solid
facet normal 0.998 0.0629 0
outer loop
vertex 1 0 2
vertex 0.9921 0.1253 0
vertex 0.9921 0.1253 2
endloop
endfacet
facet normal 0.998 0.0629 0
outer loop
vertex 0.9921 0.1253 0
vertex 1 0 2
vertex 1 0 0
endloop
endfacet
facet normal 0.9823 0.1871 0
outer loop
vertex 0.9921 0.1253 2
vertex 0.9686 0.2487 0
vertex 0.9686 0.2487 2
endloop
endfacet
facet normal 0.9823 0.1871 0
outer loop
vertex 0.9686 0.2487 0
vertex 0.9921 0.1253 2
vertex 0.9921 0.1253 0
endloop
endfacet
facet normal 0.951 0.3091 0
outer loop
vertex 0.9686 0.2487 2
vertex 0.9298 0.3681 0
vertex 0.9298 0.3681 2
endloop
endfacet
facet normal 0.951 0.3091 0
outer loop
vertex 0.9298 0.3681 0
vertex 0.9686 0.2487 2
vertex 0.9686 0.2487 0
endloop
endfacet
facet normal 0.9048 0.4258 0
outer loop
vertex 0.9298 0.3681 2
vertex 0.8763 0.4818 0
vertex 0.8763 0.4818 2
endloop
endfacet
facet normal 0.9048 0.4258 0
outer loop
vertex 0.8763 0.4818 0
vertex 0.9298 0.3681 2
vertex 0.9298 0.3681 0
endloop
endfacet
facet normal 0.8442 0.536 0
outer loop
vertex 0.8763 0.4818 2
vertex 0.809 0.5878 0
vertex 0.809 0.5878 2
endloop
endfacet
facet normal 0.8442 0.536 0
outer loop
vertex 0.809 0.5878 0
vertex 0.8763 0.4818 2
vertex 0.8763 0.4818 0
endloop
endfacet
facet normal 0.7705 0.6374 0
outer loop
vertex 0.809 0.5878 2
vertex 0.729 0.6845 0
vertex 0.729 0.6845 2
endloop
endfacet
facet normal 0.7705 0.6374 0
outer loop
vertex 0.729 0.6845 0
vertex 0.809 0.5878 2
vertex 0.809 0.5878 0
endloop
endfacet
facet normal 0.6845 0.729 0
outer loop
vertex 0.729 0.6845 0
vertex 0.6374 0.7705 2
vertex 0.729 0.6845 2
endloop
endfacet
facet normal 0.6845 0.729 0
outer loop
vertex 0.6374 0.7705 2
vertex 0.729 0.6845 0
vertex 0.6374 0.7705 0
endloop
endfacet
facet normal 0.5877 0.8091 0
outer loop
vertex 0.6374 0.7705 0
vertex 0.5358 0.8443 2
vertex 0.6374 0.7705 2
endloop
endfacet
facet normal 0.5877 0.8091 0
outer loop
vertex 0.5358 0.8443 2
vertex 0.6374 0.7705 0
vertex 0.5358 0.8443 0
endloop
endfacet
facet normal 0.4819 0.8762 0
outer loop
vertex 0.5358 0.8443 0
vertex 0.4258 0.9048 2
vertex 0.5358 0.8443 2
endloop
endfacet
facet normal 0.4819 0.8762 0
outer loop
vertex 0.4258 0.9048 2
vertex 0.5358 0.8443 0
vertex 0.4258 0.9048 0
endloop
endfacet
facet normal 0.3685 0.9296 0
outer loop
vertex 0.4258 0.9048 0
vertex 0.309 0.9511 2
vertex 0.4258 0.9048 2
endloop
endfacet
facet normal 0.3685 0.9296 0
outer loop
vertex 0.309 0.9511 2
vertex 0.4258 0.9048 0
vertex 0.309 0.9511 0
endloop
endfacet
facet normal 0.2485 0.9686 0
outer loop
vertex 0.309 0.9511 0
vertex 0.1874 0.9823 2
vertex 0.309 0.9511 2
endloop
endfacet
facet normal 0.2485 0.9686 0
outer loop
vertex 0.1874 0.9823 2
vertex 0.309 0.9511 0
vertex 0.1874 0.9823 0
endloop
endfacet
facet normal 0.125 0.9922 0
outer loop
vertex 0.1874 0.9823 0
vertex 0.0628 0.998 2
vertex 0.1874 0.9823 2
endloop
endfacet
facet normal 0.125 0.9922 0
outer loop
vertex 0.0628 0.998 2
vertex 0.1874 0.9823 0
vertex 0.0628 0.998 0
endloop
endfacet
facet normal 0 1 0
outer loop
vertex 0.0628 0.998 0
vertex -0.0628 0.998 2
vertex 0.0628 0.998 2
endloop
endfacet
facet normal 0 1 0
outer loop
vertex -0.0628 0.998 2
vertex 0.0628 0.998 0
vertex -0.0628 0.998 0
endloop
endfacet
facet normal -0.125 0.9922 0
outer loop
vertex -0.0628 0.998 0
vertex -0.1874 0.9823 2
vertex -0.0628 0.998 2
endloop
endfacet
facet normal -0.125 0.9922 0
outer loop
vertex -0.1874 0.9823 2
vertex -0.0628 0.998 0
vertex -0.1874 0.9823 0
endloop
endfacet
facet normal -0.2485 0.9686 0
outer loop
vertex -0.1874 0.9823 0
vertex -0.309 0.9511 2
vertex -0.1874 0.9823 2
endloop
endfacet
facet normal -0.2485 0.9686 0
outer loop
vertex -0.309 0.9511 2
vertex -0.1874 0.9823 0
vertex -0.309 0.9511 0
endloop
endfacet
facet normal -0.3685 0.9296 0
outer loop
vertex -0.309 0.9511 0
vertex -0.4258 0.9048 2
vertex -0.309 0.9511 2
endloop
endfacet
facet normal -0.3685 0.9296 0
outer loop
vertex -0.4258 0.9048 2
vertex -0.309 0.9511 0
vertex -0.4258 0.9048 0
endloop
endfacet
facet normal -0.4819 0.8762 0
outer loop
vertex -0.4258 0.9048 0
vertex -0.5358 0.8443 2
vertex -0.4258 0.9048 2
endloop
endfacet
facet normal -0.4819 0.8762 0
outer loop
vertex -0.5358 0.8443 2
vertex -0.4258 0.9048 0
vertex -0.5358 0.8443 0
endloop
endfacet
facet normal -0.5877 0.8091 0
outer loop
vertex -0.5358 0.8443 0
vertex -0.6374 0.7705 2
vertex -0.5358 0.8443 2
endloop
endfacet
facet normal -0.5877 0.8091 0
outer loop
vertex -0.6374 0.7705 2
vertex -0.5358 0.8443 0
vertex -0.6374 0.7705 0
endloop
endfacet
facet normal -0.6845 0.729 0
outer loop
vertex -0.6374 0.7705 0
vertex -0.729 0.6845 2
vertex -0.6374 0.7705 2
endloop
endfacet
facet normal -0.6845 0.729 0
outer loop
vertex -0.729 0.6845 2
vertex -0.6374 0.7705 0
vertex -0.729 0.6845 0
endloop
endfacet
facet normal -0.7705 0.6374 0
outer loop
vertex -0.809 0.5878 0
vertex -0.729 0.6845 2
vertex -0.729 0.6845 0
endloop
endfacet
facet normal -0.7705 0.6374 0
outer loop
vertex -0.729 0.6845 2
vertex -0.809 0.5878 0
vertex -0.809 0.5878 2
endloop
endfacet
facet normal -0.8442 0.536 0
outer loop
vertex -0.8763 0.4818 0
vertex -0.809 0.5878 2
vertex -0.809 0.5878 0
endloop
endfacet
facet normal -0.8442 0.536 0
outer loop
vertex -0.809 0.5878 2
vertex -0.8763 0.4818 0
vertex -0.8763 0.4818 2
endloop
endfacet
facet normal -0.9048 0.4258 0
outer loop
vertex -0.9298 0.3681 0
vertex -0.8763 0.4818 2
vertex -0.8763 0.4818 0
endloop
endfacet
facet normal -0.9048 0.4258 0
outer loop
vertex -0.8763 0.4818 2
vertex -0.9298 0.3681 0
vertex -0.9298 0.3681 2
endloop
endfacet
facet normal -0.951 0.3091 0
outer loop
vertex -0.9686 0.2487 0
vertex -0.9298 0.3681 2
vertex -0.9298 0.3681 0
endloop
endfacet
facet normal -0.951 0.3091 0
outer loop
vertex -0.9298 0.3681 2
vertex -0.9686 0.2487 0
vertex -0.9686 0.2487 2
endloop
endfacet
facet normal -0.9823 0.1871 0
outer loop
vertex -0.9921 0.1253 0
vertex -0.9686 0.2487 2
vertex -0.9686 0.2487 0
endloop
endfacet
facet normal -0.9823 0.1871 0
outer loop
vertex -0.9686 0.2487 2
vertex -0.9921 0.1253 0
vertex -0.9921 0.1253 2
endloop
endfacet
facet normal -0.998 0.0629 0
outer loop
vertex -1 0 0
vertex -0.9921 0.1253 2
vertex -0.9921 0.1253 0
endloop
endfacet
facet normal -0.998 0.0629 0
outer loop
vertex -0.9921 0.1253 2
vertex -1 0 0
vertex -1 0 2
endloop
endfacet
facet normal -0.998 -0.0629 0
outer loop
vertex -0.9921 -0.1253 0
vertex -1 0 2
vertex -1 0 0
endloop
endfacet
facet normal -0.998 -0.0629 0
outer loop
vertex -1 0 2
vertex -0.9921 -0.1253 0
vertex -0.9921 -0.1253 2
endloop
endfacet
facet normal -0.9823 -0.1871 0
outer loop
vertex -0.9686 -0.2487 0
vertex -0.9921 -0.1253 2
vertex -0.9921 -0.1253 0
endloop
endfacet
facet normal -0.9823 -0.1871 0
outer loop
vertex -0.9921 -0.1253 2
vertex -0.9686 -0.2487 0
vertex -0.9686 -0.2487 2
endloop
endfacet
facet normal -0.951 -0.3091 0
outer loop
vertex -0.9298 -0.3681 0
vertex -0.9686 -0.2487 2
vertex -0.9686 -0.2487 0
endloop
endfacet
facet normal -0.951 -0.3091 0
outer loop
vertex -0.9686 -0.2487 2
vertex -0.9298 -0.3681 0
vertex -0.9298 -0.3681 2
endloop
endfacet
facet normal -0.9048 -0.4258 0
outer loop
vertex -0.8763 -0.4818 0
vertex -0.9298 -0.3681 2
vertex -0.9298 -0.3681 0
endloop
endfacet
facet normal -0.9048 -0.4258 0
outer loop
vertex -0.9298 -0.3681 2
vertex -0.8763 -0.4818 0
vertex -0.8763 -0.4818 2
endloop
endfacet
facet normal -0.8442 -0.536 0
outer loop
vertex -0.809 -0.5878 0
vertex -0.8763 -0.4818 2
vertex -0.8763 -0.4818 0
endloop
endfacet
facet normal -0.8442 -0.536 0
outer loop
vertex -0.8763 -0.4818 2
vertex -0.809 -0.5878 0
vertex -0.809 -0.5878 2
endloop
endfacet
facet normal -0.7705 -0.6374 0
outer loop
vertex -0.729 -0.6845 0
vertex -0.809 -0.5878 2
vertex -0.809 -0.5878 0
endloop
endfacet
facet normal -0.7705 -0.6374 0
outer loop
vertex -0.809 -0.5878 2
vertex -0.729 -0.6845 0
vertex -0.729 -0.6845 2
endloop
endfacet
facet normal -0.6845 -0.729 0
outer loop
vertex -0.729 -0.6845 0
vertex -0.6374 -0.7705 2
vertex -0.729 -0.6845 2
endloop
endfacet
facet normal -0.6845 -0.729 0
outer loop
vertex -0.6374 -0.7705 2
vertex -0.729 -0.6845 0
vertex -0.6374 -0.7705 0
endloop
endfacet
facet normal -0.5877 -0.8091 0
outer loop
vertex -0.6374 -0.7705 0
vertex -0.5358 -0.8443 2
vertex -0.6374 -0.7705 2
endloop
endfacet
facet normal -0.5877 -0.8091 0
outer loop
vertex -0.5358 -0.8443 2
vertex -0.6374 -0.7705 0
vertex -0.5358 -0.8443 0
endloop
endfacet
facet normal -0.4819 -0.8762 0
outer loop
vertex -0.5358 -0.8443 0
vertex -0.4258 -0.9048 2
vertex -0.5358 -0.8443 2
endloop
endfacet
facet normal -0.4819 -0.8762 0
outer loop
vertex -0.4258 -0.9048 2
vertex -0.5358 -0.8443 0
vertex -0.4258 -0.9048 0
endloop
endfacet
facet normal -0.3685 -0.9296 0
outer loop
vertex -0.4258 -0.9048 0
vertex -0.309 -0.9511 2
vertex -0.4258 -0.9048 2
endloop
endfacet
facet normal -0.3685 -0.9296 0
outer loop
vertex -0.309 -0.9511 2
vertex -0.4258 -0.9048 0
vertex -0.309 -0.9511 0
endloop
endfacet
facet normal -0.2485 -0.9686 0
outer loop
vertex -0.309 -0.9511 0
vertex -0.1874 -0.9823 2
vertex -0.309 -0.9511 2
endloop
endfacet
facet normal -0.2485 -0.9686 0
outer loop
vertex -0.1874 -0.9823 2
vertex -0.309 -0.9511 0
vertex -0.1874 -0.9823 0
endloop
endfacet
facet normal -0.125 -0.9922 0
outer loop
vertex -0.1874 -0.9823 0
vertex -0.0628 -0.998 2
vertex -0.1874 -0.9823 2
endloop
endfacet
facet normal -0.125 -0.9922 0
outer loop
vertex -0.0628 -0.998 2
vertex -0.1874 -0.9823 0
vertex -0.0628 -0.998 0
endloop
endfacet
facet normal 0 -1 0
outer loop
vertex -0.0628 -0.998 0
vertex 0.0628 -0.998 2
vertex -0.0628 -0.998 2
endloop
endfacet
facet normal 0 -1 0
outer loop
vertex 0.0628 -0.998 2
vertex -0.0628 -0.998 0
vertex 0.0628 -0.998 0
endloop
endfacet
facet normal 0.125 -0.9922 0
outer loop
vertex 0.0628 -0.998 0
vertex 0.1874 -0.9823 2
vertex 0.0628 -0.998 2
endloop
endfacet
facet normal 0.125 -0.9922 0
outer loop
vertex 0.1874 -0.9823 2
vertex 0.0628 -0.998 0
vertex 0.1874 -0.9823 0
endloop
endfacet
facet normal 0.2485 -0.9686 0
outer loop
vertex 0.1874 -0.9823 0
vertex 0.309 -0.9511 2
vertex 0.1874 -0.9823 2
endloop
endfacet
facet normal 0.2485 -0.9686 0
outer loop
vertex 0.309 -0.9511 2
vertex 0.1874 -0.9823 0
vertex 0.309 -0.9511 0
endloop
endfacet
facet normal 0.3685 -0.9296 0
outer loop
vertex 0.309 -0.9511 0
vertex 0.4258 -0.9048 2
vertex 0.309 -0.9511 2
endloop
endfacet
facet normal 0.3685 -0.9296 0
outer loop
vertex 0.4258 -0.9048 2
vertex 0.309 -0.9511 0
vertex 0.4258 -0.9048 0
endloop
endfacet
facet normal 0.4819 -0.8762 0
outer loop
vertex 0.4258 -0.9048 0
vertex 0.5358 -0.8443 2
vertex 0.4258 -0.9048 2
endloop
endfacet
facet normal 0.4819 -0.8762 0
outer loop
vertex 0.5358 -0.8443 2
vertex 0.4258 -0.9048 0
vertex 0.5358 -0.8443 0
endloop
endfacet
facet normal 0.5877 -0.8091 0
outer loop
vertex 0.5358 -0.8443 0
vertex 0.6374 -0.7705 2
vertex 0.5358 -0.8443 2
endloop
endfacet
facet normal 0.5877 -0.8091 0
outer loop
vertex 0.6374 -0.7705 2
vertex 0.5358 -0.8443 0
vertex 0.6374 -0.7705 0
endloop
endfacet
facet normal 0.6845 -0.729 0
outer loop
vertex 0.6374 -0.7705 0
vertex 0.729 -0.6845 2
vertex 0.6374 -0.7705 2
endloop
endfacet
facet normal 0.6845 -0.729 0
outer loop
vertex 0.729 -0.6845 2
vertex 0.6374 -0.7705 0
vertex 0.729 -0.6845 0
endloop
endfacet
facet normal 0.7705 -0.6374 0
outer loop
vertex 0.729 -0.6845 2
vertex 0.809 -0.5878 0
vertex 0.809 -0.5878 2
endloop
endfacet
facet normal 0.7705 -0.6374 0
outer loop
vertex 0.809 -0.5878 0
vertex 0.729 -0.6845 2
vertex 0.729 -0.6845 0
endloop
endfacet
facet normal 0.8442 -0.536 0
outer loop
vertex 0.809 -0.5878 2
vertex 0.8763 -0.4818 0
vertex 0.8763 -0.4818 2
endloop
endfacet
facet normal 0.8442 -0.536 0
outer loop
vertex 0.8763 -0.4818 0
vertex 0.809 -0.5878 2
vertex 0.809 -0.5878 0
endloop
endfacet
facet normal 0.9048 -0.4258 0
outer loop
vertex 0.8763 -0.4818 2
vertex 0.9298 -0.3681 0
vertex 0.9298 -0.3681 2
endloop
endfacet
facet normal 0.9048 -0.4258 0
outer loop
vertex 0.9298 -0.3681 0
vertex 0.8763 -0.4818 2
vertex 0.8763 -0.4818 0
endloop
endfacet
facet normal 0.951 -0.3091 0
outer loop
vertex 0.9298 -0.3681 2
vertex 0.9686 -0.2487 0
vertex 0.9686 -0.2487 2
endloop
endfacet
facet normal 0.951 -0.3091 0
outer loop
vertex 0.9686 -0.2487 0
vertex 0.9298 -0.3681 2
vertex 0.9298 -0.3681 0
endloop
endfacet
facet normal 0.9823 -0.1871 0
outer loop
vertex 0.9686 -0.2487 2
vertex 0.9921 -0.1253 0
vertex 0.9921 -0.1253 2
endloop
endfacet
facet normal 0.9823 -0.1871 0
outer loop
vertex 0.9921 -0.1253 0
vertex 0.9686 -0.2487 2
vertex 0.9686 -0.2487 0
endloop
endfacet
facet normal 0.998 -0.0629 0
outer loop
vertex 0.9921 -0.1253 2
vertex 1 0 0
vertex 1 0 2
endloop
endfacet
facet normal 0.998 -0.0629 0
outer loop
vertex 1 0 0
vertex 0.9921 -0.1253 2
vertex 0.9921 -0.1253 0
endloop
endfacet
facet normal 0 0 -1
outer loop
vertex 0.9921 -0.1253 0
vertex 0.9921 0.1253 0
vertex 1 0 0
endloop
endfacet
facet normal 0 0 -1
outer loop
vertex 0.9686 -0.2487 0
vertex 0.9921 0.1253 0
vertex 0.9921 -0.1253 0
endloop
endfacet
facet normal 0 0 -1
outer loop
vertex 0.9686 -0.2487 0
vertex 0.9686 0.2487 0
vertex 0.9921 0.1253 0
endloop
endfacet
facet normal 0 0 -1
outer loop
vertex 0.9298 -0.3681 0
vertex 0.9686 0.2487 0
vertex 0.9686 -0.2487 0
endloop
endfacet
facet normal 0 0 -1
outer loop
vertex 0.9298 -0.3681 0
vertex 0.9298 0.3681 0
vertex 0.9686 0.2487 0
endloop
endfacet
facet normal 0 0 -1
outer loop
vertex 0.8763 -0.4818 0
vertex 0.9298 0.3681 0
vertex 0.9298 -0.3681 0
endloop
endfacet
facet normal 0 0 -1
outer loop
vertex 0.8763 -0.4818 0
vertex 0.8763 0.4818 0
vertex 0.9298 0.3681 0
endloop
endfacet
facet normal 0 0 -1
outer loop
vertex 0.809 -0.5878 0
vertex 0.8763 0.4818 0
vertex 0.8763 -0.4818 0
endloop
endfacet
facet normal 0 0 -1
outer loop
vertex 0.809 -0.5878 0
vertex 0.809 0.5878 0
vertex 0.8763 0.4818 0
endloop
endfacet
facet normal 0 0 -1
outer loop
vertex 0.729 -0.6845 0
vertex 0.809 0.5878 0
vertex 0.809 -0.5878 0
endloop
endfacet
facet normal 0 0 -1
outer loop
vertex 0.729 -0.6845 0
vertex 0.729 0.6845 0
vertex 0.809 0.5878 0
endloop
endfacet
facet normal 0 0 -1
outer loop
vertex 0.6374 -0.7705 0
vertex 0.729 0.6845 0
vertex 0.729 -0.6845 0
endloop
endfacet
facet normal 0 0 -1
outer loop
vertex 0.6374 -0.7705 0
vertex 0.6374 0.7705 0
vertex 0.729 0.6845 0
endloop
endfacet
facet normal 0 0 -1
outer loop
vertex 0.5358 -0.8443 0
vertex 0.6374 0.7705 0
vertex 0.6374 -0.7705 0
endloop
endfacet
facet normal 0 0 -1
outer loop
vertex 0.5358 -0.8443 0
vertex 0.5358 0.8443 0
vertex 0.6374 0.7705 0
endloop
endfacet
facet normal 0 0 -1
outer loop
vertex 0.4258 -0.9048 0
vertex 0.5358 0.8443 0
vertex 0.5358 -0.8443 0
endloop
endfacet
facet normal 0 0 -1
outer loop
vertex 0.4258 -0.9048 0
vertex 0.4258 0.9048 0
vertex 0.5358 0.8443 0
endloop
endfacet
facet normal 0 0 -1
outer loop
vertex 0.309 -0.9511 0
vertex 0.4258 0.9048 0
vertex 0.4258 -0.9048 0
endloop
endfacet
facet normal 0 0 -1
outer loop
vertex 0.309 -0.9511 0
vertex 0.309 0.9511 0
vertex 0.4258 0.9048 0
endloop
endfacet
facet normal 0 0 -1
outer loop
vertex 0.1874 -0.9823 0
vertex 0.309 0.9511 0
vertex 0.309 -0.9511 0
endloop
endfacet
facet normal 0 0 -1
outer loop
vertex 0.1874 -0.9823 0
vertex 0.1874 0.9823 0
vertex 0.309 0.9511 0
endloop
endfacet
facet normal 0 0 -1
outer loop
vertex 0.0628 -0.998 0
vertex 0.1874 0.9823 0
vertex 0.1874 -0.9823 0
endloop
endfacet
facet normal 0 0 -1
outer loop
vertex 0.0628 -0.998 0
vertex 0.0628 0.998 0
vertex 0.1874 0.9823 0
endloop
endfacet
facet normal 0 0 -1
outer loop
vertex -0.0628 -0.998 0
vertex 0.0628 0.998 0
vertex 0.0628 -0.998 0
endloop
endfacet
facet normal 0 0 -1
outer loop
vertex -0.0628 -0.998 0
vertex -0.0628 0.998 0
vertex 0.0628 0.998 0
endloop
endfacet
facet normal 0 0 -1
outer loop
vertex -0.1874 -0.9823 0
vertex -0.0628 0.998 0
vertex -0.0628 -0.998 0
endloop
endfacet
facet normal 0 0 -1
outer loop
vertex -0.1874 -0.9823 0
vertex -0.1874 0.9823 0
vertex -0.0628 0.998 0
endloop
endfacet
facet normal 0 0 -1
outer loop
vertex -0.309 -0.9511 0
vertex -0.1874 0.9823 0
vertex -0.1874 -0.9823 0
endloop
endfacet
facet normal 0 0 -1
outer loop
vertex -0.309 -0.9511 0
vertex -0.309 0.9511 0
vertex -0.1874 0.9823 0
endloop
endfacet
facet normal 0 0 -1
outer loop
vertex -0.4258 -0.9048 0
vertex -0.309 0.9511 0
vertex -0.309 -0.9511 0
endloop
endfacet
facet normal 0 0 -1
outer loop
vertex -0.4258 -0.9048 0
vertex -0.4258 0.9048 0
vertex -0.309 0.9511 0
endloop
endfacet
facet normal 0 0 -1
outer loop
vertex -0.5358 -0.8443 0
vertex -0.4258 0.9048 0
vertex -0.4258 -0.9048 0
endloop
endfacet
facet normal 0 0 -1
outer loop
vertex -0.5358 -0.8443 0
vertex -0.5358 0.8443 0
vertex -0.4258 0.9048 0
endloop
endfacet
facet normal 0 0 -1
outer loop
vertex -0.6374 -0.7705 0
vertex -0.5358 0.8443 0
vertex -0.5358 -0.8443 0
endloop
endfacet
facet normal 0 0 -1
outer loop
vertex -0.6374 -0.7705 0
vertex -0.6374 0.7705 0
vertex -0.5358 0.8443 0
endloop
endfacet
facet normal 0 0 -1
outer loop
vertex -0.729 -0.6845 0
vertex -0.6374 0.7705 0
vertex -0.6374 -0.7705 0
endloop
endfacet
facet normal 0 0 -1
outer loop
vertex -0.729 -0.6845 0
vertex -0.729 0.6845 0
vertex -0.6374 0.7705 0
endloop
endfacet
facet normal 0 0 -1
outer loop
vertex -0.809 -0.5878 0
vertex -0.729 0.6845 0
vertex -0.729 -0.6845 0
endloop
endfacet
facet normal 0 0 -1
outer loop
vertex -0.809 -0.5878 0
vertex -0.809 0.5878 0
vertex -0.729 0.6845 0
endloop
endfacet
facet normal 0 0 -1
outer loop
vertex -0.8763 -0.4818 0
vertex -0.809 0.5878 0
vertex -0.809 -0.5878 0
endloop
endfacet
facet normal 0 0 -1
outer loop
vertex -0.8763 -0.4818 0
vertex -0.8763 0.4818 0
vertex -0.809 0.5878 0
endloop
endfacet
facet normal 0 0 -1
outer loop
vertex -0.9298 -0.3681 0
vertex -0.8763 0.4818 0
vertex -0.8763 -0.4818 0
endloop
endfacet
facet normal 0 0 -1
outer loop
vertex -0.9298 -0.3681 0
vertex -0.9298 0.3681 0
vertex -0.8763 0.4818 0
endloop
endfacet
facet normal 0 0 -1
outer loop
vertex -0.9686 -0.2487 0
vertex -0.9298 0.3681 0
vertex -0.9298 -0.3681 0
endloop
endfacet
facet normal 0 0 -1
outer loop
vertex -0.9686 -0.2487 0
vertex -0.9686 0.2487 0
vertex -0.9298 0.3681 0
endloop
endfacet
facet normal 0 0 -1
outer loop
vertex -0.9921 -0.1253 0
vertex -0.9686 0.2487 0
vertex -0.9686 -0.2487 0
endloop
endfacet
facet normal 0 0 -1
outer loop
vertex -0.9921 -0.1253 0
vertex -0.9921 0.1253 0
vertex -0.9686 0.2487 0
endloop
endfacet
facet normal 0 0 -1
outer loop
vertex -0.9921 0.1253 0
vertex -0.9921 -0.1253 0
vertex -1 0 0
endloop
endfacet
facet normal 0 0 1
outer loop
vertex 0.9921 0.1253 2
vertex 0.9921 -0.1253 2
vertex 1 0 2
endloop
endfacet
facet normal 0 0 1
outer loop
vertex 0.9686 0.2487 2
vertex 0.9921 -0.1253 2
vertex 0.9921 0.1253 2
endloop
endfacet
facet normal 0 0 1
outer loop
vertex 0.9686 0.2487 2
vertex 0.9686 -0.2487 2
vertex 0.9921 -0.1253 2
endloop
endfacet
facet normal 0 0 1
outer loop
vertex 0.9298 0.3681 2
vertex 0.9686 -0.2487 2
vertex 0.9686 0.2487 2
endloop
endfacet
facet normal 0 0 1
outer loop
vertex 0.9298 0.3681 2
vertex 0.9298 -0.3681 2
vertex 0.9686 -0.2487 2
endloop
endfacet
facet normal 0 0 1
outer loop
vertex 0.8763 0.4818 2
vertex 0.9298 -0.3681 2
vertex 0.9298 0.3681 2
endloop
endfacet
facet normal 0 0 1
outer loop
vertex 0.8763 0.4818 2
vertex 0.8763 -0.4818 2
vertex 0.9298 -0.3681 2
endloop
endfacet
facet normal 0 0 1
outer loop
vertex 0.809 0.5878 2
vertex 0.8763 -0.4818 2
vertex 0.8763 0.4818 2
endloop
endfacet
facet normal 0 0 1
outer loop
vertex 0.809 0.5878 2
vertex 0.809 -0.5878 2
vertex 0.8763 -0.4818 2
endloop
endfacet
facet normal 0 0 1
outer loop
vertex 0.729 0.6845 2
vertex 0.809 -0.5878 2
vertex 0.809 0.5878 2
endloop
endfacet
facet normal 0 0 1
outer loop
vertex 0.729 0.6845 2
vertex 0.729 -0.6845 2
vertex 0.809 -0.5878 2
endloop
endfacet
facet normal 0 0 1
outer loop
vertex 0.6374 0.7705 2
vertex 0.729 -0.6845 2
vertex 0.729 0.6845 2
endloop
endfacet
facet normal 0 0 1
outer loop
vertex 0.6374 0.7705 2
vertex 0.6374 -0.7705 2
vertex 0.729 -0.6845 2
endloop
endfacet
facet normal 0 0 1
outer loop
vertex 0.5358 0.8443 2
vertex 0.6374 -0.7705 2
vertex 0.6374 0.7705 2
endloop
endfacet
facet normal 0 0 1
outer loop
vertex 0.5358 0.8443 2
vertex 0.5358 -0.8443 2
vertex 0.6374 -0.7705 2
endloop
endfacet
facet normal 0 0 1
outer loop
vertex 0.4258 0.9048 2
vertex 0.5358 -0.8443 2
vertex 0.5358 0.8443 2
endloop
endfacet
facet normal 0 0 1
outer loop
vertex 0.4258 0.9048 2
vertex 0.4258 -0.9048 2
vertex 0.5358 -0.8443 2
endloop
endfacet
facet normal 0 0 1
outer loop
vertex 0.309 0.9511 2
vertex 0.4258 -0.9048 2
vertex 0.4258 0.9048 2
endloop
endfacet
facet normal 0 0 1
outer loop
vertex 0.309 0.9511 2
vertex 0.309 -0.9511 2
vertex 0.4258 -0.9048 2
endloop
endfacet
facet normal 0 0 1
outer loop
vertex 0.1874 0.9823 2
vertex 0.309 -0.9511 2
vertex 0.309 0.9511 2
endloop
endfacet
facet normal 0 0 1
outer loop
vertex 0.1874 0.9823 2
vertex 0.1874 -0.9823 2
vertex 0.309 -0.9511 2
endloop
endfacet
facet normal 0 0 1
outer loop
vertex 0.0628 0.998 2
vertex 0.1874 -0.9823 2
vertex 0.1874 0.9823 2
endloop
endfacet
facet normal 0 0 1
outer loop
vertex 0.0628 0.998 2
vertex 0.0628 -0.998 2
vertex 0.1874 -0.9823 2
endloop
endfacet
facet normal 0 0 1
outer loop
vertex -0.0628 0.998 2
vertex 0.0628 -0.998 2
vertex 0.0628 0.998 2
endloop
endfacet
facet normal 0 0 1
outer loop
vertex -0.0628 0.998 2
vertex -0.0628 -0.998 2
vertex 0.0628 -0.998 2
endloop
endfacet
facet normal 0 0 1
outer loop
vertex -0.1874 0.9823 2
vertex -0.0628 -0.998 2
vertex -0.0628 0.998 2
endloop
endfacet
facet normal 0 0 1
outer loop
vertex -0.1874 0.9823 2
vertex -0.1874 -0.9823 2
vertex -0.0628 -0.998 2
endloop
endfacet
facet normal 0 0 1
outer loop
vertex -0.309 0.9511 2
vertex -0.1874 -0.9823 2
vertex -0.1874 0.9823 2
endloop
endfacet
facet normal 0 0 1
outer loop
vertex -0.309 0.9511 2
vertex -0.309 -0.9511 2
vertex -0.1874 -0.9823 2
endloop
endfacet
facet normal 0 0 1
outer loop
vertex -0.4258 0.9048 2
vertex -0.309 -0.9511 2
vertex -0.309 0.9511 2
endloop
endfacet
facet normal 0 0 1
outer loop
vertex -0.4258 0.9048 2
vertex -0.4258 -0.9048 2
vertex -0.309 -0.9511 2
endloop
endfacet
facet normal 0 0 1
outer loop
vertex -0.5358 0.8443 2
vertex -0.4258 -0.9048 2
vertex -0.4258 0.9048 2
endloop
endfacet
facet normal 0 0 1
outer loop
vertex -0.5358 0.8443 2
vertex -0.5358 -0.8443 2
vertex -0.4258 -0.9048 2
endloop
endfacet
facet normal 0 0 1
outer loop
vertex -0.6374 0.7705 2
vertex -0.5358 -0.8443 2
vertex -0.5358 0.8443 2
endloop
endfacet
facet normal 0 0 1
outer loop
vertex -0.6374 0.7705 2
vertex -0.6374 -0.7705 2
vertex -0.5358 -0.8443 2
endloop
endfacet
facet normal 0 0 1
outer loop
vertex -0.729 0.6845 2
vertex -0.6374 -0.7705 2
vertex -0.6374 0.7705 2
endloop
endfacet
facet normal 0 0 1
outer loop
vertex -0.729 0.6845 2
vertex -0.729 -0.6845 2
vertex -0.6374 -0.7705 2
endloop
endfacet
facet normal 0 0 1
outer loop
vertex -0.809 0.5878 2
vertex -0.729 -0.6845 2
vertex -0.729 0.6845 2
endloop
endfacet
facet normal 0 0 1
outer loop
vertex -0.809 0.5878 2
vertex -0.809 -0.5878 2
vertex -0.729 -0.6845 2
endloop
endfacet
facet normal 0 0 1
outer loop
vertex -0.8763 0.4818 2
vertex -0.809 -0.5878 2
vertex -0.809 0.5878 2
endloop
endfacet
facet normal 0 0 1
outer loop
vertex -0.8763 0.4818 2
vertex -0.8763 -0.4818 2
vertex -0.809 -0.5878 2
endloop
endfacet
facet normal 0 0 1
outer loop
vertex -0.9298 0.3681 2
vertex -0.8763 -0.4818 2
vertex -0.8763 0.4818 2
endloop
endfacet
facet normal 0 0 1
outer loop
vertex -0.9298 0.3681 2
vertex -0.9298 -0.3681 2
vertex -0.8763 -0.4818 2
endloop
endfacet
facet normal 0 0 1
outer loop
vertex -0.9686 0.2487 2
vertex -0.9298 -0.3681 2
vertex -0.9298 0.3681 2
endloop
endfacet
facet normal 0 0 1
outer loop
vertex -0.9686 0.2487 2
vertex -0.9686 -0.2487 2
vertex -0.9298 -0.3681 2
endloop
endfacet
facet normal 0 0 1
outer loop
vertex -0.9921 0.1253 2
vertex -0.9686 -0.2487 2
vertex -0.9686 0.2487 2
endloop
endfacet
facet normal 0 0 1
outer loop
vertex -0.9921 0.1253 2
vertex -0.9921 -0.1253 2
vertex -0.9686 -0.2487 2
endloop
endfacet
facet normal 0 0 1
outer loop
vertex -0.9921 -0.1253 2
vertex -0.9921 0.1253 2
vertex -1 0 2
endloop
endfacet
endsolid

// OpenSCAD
// @kuberlog
// units are in CM

name = "chiron";

$fn=50;
cylinder(d=2, h=2);
